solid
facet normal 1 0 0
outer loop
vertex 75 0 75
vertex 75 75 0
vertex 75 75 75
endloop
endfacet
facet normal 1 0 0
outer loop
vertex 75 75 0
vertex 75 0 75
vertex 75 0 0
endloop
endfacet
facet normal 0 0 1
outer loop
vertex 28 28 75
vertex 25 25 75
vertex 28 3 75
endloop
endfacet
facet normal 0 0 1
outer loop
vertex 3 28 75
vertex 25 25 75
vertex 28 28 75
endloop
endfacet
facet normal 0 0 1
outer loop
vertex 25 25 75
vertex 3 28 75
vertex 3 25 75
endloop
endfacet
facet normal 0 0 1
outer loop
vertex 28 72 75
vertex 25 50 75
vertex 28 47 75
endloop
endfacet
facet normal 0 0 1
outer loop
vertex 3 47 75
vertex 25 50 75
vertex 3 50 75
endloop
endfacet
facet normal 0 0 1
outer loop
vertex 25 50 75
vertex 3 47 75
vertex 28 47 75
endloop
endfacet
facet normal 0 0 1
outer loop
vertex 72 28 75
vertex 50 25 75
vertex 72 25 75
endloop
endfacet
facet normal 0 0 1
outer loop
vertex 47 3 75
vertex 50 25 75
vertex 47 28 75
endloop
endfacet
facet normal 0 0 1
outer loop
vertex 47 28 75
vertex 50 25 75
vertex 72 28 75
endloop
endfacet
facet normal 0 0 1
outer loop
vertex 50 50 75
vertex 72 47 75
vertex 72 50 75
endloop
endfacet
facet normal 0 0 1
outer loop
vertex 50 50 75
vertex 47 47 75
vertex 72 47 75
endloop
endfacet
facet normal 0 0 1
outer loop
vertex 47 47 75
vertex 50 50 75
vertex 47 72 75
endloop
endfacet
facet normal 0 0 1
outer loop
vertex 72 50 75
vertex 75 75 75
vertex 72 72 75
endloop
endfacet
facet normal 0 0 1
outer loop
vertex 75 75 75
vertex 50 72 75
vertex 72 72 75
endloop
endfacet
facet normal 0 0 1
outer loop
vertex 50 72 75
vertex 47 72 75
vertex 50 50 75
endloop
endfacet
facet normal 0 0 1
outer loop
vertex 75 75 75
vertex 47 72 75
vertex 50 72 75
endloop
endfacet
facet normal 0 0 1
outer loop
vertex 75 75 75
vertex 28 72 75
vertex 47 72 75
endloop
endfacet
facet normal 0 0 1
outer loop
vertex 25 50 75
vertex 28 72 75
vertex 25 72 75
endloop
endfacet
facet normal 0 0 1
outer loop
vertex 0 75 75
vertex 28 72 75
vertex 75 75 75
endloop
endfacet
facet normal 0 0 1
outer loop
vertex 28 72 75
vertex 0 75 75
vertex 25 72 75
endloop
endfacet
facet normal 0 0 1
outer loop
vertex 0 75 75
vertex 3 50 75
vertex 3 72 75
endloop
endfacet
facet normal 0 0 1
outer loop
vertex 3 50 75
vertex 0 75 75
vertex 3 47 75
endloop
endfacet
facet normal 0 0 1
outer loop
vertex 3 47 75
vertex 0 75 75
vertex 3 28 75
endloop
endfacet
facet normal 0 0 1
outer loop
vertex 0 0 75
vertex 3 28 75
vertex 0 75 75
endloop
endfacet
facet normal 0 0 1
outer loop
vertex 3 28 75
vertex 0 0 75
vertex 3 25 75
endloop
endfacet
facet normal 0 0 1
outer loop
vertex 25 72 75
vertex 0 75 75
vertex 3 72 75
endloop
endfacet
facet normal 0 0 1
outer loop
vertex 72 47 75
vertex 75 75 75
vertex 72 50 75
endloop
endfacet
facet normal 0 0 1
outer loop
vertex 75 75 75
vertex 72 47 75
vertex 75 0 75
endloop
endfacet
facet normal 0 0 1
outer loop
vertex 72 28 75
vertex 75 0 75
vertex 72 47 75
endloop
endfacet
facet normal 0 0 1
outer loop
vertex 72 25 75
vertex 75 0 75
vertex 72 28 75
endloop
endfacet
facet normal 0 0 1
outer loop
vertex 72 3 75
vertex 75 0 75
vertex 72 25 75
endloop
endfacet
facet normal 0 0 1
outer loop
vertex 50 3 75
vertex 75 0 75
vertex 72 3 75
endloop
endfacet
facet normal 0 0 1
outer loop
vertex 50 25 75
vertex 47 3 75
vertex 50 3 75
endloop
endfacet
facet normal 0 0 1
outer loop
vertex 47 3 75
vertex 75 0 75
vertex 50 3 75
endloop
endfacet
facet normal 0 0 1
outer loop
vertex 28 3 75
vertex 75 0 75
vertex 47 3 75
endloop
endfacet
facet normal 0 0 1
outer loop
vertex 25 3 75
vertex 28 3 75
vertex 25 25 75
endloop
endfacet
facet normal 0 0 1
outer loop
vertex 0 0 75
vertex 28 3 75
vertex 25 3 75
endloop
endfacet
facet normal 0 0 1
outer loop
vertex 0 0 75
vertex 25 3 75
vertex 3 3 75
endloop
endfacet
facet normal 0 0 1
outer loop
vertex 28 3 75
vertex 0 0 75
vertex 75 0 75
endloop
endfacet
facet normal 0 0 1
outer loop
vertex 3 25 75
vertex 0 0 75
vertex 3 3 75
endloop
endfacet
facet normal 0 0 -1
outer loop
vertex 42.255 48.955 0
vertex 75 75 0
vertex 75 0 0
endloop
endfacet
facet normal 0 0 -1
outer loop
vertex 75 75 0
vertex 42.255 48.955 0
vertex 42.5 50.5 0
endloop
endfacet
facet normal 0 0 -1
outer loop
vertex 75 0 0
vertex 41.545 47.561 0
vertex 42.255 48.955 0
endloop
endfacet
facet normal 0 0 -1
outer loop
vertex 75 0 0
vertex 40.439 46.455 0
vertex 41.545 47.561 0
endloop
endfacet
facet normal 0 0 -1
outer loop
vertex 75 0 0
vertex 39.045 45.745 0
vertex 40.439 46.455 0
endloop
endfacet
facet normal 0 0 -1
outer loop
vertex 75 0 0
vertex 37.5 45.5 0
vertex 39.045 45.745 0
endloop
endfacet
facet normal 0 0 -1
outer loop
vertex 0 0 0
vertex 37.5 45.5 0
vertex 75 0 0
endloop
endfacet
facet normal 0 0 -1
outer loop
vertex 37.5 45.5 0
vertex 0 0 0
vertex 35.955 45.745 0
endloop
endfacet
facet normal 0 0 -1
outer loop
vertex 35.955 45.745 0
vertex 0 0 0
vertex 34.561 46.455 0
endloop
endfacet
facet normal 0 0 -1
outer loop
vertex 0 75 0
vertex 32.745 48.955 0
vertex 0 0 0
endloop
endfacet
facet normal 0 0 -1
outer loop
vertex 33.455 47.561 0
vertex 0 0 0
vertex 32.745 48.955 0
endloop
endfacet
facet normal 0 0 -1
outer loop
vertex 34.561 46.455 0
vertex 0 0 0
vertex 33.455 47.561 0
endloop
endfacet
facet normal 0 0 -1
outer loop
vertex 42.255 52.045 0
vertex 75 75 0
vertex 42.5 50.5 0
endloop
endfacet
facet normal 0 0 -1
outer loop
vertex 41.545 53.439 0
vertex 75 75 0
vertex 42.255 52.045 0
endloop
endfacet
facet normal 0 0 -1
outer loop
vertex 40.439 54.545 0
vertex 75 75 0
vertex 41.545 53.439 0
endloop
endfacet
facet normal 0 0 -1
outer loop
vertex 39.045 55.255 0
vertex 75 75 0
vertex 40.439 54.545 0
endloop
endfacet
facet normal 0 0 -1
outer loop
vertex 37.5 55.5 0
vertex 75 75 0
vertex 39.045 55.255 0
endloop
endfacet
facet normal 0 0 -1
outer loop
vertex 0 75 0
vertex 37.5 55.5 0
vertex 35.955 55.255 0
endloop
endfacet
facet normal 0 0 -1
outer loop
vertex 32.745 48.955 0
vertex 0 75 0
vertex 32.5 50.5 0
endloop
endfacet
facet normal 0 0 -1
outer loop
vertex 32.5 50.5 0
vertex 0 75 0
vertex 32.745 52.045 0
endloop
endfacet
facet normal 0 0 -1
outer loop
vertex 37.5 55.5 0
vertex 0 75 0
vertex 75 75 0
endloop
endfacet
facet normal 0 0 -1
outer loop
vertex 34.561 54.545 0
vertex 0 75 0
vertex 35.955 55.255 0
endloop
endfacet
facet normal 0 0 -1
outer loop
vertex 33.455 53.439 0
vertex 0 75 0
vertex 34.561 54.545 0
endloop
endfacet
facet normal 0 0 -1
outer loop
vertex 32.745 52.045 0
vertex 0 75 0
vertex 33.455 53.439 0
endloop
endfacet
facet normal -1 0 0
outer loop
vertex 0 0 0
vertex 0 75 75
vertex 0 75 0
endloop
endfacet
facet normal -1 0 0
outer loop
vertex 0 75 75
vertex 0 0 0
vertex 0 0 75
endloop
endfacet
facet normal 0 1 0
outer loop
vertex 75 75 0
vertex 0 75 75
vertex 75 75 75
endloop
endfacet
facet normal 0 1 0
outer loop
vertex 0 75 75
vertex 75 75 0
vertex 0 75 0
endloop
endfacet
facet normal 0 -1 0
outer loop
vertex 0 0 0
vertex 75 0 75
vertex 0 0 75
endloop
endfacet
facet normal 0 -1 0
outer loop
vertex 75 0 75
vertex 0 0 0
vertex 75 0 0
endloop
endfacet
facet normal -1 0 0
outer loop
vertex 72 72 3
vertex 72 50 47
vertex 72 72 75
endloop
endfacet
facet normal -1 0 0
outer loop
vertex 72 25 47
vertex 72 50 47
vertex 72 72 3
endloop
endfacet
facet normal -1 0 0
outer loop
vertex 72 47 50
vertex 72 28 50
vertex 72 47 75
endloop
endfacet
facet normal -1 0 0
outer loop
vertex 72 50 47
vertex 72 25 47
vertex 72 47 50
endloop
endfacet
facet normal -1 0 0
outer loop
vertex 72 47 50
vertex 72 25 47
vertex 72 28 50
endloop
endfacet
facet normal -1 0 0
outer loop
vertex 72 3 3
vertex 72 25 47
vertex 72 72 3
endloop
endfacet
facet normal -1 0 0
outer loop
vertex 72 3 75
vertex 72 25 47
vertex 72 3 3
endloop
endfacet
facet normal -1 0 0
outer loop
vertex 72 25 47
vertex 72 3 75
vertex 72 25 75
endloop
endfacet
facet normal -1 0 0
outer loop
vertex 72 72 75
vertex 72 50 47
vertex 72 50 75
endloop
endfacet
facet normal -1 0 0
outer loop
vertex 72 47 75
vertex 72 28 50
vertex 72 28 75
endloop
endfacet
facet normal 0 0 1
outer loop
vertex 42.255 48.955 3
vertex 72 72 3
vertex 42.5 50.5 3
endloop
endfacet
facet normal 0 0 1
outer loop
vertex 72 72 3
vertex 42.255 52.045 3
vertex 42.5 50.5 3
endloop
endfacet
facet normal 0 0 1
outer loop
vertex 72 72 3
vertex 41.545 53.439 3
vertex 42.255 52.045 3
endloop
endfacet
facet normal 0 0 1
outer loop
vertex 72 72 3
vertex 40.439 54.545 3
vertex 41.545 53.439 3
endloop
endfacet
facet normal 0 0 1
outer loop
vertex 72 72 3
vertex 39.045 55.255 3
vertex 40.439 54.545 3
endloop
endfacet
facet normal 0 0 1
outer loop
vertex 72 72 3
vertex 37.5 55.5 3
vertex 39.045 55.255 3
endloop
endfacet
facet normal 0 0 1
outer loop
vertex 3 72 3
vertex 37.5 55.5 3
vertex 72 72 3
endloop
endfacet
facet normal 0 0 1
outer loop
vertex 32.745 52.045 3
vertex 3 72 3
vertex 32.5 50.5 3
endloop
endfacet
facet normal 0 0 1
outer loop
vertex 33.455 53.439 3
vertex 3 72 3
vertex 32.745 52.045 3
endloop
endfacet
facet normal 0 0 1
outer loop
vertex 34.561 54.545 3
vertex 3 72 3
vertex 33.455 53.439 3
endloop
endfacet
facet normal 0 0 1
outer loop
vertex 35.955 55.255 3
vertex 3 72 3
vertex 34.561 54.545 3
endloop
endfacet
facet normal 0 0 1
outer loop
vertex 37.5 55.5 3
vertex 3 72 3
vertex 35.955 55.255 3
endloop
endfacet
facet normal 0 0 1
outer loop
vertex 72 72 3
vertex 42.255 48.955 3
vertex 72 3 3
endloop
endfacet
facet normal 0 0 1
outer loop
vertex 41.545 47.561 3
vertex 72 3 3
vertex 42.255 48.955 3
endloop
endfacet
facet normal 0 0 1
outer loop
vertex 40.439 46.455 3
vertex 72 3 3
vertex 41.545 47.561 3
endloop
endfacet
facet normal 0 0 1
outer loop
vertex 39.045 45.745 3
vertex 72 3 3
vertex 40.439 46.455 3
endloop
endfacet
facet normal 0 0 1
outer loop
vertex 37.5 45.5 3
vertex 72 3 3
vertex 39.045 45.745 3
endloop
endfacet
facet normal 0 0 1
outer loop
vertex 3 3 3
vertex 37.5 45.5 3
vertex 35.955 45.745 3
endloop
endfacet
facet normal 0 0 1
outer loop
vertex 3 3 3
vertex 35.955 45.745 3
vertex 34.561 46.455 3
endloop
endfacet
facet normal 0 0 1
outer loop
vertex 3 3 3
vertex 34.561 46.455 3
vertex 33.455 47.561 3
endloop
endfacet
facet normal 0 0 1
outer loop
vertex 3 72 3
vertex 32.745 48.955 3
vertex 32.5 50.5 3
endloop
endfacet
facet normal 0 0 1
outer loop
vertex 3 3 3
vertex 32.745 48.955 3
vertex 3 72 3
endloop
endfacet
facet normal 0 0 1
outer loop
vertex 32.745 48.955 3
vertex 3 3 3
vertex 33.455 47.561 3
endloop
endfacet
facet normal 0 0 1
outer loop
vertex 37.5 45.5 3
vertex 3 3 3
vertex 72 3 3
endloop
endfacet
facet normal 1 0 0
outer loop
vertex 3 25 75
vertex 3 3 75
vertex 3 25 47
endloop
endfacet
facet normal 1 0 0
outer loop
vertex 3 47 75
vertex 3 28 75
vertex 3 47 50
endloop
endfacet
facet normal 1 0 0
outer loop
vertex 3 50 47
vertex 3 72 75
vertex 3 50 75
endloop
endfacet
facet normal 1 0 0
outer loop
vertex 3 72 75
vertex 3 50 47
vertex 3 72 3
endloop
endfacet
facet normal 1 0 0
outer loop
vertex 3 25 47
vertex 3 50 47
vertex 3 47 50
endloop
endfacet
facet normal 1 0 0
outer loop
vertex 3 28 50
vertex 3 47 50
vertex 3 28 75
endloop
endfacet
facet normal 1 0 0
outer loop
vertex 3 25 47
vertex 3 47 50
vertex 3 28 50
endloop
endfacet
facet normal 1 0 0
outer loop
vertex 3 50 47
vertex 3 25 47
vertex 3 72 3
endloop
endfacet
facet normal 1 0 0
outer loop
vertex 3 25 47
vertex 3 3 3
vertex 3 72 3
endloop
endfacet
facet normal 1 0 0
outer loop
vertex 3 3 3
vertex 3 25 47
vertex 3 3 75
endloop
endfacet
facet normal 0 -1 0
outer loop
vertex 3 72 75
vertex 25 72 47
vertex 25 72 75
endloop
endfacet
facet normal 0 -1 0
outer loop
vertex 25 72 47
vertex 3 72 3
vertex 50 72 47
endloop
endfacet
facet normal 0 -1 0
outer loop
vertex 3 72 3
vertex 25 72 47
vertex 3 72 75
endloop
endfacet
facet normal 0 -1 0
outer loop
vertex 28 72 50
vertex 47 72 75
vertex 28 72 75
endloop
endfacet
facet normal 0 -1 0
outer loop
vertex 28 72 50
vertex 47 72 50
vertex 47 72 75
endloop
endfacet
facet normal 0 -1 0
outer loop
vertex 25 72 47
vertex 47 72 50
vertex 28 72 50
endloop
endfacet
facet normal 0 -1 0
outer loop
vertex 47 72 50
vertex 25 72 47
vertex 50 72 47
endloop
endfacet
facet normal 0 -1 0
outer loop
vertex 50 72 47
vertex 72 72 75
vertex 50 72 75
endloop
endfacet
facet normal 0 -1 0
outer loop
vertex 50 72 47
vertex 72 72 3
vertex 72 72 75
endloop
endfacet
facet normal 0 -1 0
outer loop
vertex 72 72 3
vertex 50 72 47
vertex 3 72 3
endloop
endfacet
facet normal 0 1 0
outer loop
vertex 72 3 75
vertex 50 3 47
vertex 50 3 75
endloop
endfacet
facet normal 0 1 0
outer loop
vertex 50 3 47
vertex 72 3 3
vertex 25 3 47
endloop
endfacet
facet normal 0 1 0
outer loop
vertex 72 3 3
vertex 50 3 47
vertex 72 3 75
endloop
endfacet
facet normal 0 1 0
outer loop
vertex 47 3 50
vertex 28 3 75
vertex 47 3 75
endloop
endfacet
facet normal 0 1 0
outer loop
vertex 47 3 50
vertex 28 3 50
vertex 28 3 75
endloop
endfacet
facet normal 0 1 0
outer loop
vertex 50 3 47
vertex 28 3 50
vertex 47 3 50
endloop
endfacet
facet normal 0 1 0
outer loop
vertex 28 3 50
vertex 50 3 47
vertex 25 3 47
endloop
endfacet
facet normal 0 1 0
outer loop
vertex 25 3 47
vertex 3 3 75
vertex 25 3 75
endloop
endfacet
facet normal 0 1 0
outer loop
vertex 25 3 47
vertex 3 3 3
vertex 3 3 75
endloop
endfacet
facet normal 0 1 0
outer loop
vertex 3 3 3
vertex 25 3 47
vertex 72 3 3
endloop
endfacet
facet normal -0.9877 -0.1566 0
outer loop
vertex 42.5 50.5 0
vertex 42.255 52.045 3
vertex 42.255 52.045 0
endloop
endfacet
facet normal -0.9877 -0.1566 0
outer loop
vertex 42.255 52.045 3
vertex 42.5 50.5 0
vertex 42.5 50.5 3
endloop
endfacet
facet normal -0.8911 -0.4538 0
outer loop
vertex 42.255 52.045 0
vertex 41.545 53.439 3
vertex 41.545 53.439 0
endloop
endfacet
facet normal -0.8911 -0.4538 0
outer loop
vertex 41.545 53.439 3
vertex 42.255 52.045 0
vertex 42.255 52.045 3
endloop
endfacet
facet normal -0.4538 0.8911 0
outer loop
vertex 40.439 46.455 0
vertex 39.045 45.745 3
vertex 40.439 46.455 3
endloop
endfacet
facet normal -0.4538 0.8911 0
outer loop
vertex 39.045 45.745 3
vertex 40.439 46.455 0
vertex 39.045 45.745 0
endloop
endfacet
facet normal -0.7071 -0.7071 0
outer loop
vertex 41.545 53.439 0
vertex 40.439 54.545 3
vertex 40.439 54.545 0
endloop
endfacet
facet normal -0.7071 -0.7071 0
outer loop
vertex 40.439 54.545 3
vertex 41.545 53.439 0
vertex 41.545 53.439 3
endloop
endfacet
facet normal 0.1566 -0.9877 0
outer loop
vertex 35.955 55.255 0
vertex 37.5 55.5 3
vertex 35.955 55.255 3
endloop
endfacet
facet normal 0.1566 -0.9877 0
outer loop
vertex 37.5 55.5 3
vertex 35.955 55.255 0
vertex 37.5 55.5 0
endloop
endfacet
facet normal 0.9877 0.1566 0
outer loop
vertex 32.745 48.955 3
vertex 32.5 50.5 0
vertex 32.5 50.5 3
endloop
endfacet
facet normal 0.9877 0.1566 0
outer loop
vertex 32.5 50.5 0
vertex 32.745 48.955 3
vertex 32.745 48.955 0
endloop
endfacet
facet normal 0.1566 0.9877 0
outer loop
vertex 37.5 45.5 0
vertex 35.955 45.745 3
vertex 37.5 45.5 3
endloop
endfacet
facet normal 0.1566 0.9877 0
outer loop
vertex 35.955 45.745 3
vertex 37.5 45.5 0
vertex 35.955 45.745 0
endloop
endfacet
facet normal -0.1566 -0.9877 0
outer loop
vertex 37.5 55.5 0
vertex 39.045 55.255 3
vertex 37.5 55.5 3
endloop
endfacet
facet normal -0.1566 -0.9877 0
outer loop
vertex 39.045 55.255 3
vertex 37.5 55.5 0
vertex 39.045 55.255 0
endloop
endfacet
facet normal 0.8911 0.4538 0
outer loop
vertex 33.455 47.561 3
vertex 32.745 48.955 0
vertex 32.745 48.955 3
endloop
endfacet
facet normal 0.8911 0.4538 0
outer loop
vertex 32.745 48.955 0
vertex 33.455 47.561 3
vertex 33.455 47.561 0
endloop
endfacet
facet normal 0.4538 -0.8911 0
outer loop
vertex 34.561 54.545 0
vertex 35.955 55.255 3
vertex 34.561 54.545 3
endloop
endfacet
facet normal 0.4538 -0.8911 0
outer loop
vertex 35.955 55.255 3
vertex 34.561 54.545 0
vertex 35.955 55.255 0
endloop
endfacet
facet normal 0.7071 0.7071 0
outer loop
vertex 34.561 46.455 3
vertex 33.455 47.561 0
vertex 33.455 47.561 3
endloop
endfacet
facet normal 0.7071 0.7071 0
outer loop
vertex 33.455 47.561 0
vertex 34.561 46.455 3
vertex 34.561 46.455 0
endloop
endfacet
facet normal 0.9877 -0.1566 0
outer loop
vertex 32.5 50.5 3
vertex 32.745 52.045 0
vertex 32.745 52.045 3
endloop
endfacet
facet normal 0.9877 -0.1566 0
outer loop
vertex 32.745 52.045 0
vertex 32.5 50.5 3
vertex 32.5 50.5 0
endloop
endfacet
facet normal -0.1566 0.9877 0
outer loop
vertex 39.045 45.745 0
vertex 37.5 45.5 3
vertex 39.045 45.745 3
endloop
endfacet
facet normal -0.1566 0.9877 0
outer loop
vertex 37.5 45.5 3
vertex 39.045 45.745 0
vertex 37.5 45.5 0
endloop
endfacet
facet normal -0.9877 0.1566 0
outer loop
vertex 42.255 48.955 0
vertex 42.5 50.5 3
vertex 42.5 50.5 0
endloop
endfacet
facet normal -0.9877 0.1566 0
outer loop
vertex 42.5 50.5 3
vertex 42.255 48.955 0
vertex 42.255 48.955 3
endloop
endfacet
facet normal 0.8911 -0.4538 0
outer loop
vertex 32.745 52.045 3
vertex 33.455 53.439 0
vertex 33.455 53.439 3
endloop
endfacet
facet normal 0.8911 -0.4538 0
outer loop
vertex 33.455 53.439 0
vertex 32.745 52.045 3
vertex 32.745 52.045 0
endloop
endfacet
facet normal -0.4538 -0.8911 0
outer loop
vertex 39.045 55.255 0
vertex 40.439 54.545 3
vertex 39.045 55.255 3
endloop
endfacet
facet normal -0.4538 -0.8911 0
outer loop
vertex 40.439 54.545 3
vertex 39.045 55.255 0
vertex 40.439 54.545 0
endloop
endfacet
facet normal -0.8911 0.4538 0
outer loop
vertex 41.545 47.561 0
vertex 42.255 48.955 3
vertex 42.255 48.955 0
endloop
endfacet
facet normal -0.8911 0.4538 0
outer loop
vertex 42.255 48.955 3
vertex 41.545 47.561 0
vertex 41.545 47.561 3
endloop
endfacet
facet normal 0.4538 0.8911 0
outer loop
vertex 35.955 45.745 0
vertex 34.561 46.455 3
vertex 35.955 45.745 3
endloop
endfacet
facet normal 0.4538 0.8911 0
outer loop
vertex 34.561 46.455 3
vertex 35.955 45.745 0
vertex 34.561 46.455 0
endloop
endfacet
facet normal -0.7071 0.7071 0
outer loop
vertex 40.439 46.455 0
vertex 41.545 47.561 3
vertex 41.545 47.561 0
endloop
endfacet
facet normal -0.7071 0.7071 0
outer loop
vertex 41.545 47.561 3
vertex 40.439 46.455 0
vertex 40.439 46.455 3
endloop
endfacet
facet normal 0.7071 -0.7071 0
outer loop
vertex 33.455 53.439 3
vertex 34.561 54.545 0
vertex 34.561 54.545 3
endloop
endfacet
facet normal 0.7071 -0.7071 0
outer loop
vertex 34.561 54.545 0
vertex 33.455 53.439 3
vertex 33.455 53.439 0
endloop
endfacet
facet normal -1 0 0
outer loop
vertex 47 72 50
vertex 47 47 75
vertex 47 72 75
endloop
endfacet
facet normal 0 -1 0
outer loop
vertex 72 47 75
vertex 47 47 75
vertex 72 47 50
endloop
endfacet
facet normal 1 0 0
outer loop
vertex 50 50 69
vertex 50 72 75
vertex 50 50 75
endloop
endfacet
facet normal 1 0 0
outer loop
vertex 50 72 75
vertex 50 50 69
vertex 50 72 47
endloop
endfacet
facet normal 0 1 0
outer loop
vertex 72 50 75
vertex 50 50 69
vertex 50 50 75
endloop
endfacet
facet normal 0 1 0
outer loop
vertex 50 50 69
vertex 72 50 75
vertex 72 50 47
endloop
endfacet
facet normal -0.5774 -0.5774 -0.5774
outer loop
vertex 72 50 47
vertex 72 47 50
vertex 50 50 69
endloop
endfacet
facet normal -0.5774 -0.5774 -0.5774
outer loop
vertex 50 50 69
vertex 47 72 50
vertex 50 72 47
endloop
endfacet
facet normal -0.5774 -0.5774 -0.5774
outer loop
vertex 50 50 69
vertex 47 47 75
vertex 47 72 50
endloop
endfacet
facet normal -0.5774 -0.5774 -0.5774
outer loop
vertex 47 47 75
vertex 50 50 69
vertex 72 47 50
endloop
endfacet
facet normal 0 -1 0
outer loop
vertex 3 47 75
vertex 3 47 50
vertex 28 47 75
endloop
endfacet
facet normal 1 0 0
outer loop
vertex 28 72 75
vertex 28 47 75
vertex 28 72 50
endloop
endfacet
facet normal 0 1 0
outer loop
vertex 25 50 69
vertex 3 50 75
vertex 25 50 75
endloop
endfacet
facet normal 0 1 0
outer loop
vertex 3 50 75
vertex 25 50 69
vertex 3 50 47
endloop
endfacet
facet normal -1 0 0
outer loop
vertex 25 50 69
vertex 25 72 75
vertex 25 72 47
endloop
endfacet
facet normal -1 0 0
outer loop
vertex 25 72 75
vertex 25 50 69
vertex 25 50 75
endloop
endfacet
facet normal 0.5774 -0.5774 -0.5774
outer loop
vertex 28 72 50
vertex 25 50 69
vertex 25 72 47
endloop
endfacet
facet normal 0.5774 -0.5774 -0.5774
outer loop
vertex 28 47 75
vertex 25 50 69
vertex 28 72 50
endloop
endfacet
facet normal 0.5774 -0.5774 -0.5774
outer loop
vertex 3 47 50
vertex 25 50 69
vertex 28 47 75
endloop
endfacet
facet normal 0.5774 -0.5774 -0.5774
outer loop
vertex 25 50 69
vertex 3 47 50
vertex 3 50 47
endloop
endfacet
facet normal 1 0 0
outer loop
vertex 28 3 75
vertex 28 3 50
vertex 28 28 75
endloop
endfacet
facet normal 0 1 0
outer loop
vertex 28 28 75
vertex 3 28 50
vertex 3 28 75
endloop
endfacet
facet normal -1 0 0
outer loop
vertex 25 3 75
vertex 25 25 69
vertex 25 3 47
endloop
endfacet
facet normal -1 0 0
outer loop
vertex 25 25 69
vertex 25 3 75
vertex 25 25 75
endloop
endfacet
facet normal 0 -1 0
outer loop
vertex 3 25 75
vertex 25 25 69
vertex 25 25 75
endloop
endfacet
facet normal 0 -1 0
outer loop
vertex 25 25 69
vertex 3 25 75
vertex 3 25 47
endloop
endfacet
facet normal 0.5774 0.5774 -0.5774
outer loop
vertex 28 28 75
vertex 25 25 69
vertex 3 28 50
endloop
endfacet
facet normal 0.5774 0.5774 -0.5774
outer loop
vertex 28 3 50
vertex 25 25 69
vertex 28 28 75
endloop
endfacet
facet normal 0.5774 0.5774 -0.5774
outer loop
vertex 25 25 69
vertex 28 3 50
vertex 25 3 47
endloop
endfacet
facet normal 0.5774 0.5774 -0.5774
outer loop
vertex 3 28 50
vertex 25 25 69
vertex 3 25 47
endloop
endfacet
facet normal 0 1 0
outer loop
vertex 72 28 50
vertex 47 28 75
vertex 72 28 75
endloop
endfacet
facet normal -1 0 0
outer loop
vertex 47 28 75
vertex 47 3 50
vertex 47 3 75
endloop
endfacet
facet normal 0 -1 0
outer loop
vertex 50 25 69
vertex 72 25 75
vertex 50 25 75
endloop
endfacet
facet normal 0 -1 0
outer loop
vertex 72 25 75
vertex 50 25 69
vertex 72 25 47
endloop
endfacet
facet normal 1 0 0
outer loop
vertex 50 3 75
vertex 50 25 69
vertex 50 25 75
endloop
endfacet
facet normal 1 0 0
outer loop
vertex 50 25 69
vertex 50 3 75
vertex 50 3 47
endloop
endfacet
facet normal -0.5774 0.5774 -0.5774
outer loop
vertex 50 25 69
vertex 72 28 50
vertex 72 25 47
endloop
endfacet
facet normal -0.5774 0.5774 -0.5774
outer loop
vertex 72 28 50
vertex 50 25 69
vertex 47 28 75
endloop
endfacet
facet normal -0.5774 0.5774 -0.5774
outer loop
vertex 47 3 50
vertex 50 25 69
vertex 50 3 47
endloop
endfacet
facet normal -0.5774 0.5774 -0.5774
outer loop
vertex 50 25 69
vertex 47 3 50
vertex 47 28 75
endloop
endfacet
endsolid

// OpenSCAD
// file: variables.scad
$fn=20;
outer_size = 75;
thickness = 3;
pipe_d = 10;
pipe_x = pipe_d + thickness*2;
pipe_y = pipe_d*2 + thickness*3;
pipe_z = outer_size - thickness - 10;
// main file
include <variables.scad>;

cup_base();

module cup_base() {
     difference() {
          // make a hole on cup_base because openscad seems not to be able to substract an object
          // from an included object
          shell();
          translate([outer_size/2, outer_size/2+pipe_y-pipe_d-thickness*2, 0]) {
               cylinder(d1=pipe_d, d2=pipe_d, h=thickness);
          }
     }
     holders();
}

module shell() {
     difference() {
          cube(outer_size);
          translate([thickness,thickness,thickness])
               cube([outer_size-thickness*2, outer_size-thickness*2, outer_size-thickness]);
     }
}

holder_size = 28;
holder_inner_size = holder_size - thickness*2;
points = [[0,0,0], [holder_size,0,0], [0,holder_size,0], [0,0,holder_size]];
faces = [[0,1,2], [0,3,1], [0,2,3], [1,3,2]];

module holder() {
     difference() {
          cube([holder_size, holder_size, holder_size]);
          translate([thickness, thickness, 0]) {
               cube([holder_inner_size, holder_inner_size, holder_size]);
          }
          polyhedron(points, faces);
     }
}

module holders() {
     translate([outer_size/2, outer_size/2, outer_size-holder_size]) {
          for(angle=[0:90:359]) {
               rotate(angle) {
                    translate([outer_size/2-holder_size, outer_size/2-holder_size, 0]) {
                         holder();
                    }
               }
          }
     }
}
